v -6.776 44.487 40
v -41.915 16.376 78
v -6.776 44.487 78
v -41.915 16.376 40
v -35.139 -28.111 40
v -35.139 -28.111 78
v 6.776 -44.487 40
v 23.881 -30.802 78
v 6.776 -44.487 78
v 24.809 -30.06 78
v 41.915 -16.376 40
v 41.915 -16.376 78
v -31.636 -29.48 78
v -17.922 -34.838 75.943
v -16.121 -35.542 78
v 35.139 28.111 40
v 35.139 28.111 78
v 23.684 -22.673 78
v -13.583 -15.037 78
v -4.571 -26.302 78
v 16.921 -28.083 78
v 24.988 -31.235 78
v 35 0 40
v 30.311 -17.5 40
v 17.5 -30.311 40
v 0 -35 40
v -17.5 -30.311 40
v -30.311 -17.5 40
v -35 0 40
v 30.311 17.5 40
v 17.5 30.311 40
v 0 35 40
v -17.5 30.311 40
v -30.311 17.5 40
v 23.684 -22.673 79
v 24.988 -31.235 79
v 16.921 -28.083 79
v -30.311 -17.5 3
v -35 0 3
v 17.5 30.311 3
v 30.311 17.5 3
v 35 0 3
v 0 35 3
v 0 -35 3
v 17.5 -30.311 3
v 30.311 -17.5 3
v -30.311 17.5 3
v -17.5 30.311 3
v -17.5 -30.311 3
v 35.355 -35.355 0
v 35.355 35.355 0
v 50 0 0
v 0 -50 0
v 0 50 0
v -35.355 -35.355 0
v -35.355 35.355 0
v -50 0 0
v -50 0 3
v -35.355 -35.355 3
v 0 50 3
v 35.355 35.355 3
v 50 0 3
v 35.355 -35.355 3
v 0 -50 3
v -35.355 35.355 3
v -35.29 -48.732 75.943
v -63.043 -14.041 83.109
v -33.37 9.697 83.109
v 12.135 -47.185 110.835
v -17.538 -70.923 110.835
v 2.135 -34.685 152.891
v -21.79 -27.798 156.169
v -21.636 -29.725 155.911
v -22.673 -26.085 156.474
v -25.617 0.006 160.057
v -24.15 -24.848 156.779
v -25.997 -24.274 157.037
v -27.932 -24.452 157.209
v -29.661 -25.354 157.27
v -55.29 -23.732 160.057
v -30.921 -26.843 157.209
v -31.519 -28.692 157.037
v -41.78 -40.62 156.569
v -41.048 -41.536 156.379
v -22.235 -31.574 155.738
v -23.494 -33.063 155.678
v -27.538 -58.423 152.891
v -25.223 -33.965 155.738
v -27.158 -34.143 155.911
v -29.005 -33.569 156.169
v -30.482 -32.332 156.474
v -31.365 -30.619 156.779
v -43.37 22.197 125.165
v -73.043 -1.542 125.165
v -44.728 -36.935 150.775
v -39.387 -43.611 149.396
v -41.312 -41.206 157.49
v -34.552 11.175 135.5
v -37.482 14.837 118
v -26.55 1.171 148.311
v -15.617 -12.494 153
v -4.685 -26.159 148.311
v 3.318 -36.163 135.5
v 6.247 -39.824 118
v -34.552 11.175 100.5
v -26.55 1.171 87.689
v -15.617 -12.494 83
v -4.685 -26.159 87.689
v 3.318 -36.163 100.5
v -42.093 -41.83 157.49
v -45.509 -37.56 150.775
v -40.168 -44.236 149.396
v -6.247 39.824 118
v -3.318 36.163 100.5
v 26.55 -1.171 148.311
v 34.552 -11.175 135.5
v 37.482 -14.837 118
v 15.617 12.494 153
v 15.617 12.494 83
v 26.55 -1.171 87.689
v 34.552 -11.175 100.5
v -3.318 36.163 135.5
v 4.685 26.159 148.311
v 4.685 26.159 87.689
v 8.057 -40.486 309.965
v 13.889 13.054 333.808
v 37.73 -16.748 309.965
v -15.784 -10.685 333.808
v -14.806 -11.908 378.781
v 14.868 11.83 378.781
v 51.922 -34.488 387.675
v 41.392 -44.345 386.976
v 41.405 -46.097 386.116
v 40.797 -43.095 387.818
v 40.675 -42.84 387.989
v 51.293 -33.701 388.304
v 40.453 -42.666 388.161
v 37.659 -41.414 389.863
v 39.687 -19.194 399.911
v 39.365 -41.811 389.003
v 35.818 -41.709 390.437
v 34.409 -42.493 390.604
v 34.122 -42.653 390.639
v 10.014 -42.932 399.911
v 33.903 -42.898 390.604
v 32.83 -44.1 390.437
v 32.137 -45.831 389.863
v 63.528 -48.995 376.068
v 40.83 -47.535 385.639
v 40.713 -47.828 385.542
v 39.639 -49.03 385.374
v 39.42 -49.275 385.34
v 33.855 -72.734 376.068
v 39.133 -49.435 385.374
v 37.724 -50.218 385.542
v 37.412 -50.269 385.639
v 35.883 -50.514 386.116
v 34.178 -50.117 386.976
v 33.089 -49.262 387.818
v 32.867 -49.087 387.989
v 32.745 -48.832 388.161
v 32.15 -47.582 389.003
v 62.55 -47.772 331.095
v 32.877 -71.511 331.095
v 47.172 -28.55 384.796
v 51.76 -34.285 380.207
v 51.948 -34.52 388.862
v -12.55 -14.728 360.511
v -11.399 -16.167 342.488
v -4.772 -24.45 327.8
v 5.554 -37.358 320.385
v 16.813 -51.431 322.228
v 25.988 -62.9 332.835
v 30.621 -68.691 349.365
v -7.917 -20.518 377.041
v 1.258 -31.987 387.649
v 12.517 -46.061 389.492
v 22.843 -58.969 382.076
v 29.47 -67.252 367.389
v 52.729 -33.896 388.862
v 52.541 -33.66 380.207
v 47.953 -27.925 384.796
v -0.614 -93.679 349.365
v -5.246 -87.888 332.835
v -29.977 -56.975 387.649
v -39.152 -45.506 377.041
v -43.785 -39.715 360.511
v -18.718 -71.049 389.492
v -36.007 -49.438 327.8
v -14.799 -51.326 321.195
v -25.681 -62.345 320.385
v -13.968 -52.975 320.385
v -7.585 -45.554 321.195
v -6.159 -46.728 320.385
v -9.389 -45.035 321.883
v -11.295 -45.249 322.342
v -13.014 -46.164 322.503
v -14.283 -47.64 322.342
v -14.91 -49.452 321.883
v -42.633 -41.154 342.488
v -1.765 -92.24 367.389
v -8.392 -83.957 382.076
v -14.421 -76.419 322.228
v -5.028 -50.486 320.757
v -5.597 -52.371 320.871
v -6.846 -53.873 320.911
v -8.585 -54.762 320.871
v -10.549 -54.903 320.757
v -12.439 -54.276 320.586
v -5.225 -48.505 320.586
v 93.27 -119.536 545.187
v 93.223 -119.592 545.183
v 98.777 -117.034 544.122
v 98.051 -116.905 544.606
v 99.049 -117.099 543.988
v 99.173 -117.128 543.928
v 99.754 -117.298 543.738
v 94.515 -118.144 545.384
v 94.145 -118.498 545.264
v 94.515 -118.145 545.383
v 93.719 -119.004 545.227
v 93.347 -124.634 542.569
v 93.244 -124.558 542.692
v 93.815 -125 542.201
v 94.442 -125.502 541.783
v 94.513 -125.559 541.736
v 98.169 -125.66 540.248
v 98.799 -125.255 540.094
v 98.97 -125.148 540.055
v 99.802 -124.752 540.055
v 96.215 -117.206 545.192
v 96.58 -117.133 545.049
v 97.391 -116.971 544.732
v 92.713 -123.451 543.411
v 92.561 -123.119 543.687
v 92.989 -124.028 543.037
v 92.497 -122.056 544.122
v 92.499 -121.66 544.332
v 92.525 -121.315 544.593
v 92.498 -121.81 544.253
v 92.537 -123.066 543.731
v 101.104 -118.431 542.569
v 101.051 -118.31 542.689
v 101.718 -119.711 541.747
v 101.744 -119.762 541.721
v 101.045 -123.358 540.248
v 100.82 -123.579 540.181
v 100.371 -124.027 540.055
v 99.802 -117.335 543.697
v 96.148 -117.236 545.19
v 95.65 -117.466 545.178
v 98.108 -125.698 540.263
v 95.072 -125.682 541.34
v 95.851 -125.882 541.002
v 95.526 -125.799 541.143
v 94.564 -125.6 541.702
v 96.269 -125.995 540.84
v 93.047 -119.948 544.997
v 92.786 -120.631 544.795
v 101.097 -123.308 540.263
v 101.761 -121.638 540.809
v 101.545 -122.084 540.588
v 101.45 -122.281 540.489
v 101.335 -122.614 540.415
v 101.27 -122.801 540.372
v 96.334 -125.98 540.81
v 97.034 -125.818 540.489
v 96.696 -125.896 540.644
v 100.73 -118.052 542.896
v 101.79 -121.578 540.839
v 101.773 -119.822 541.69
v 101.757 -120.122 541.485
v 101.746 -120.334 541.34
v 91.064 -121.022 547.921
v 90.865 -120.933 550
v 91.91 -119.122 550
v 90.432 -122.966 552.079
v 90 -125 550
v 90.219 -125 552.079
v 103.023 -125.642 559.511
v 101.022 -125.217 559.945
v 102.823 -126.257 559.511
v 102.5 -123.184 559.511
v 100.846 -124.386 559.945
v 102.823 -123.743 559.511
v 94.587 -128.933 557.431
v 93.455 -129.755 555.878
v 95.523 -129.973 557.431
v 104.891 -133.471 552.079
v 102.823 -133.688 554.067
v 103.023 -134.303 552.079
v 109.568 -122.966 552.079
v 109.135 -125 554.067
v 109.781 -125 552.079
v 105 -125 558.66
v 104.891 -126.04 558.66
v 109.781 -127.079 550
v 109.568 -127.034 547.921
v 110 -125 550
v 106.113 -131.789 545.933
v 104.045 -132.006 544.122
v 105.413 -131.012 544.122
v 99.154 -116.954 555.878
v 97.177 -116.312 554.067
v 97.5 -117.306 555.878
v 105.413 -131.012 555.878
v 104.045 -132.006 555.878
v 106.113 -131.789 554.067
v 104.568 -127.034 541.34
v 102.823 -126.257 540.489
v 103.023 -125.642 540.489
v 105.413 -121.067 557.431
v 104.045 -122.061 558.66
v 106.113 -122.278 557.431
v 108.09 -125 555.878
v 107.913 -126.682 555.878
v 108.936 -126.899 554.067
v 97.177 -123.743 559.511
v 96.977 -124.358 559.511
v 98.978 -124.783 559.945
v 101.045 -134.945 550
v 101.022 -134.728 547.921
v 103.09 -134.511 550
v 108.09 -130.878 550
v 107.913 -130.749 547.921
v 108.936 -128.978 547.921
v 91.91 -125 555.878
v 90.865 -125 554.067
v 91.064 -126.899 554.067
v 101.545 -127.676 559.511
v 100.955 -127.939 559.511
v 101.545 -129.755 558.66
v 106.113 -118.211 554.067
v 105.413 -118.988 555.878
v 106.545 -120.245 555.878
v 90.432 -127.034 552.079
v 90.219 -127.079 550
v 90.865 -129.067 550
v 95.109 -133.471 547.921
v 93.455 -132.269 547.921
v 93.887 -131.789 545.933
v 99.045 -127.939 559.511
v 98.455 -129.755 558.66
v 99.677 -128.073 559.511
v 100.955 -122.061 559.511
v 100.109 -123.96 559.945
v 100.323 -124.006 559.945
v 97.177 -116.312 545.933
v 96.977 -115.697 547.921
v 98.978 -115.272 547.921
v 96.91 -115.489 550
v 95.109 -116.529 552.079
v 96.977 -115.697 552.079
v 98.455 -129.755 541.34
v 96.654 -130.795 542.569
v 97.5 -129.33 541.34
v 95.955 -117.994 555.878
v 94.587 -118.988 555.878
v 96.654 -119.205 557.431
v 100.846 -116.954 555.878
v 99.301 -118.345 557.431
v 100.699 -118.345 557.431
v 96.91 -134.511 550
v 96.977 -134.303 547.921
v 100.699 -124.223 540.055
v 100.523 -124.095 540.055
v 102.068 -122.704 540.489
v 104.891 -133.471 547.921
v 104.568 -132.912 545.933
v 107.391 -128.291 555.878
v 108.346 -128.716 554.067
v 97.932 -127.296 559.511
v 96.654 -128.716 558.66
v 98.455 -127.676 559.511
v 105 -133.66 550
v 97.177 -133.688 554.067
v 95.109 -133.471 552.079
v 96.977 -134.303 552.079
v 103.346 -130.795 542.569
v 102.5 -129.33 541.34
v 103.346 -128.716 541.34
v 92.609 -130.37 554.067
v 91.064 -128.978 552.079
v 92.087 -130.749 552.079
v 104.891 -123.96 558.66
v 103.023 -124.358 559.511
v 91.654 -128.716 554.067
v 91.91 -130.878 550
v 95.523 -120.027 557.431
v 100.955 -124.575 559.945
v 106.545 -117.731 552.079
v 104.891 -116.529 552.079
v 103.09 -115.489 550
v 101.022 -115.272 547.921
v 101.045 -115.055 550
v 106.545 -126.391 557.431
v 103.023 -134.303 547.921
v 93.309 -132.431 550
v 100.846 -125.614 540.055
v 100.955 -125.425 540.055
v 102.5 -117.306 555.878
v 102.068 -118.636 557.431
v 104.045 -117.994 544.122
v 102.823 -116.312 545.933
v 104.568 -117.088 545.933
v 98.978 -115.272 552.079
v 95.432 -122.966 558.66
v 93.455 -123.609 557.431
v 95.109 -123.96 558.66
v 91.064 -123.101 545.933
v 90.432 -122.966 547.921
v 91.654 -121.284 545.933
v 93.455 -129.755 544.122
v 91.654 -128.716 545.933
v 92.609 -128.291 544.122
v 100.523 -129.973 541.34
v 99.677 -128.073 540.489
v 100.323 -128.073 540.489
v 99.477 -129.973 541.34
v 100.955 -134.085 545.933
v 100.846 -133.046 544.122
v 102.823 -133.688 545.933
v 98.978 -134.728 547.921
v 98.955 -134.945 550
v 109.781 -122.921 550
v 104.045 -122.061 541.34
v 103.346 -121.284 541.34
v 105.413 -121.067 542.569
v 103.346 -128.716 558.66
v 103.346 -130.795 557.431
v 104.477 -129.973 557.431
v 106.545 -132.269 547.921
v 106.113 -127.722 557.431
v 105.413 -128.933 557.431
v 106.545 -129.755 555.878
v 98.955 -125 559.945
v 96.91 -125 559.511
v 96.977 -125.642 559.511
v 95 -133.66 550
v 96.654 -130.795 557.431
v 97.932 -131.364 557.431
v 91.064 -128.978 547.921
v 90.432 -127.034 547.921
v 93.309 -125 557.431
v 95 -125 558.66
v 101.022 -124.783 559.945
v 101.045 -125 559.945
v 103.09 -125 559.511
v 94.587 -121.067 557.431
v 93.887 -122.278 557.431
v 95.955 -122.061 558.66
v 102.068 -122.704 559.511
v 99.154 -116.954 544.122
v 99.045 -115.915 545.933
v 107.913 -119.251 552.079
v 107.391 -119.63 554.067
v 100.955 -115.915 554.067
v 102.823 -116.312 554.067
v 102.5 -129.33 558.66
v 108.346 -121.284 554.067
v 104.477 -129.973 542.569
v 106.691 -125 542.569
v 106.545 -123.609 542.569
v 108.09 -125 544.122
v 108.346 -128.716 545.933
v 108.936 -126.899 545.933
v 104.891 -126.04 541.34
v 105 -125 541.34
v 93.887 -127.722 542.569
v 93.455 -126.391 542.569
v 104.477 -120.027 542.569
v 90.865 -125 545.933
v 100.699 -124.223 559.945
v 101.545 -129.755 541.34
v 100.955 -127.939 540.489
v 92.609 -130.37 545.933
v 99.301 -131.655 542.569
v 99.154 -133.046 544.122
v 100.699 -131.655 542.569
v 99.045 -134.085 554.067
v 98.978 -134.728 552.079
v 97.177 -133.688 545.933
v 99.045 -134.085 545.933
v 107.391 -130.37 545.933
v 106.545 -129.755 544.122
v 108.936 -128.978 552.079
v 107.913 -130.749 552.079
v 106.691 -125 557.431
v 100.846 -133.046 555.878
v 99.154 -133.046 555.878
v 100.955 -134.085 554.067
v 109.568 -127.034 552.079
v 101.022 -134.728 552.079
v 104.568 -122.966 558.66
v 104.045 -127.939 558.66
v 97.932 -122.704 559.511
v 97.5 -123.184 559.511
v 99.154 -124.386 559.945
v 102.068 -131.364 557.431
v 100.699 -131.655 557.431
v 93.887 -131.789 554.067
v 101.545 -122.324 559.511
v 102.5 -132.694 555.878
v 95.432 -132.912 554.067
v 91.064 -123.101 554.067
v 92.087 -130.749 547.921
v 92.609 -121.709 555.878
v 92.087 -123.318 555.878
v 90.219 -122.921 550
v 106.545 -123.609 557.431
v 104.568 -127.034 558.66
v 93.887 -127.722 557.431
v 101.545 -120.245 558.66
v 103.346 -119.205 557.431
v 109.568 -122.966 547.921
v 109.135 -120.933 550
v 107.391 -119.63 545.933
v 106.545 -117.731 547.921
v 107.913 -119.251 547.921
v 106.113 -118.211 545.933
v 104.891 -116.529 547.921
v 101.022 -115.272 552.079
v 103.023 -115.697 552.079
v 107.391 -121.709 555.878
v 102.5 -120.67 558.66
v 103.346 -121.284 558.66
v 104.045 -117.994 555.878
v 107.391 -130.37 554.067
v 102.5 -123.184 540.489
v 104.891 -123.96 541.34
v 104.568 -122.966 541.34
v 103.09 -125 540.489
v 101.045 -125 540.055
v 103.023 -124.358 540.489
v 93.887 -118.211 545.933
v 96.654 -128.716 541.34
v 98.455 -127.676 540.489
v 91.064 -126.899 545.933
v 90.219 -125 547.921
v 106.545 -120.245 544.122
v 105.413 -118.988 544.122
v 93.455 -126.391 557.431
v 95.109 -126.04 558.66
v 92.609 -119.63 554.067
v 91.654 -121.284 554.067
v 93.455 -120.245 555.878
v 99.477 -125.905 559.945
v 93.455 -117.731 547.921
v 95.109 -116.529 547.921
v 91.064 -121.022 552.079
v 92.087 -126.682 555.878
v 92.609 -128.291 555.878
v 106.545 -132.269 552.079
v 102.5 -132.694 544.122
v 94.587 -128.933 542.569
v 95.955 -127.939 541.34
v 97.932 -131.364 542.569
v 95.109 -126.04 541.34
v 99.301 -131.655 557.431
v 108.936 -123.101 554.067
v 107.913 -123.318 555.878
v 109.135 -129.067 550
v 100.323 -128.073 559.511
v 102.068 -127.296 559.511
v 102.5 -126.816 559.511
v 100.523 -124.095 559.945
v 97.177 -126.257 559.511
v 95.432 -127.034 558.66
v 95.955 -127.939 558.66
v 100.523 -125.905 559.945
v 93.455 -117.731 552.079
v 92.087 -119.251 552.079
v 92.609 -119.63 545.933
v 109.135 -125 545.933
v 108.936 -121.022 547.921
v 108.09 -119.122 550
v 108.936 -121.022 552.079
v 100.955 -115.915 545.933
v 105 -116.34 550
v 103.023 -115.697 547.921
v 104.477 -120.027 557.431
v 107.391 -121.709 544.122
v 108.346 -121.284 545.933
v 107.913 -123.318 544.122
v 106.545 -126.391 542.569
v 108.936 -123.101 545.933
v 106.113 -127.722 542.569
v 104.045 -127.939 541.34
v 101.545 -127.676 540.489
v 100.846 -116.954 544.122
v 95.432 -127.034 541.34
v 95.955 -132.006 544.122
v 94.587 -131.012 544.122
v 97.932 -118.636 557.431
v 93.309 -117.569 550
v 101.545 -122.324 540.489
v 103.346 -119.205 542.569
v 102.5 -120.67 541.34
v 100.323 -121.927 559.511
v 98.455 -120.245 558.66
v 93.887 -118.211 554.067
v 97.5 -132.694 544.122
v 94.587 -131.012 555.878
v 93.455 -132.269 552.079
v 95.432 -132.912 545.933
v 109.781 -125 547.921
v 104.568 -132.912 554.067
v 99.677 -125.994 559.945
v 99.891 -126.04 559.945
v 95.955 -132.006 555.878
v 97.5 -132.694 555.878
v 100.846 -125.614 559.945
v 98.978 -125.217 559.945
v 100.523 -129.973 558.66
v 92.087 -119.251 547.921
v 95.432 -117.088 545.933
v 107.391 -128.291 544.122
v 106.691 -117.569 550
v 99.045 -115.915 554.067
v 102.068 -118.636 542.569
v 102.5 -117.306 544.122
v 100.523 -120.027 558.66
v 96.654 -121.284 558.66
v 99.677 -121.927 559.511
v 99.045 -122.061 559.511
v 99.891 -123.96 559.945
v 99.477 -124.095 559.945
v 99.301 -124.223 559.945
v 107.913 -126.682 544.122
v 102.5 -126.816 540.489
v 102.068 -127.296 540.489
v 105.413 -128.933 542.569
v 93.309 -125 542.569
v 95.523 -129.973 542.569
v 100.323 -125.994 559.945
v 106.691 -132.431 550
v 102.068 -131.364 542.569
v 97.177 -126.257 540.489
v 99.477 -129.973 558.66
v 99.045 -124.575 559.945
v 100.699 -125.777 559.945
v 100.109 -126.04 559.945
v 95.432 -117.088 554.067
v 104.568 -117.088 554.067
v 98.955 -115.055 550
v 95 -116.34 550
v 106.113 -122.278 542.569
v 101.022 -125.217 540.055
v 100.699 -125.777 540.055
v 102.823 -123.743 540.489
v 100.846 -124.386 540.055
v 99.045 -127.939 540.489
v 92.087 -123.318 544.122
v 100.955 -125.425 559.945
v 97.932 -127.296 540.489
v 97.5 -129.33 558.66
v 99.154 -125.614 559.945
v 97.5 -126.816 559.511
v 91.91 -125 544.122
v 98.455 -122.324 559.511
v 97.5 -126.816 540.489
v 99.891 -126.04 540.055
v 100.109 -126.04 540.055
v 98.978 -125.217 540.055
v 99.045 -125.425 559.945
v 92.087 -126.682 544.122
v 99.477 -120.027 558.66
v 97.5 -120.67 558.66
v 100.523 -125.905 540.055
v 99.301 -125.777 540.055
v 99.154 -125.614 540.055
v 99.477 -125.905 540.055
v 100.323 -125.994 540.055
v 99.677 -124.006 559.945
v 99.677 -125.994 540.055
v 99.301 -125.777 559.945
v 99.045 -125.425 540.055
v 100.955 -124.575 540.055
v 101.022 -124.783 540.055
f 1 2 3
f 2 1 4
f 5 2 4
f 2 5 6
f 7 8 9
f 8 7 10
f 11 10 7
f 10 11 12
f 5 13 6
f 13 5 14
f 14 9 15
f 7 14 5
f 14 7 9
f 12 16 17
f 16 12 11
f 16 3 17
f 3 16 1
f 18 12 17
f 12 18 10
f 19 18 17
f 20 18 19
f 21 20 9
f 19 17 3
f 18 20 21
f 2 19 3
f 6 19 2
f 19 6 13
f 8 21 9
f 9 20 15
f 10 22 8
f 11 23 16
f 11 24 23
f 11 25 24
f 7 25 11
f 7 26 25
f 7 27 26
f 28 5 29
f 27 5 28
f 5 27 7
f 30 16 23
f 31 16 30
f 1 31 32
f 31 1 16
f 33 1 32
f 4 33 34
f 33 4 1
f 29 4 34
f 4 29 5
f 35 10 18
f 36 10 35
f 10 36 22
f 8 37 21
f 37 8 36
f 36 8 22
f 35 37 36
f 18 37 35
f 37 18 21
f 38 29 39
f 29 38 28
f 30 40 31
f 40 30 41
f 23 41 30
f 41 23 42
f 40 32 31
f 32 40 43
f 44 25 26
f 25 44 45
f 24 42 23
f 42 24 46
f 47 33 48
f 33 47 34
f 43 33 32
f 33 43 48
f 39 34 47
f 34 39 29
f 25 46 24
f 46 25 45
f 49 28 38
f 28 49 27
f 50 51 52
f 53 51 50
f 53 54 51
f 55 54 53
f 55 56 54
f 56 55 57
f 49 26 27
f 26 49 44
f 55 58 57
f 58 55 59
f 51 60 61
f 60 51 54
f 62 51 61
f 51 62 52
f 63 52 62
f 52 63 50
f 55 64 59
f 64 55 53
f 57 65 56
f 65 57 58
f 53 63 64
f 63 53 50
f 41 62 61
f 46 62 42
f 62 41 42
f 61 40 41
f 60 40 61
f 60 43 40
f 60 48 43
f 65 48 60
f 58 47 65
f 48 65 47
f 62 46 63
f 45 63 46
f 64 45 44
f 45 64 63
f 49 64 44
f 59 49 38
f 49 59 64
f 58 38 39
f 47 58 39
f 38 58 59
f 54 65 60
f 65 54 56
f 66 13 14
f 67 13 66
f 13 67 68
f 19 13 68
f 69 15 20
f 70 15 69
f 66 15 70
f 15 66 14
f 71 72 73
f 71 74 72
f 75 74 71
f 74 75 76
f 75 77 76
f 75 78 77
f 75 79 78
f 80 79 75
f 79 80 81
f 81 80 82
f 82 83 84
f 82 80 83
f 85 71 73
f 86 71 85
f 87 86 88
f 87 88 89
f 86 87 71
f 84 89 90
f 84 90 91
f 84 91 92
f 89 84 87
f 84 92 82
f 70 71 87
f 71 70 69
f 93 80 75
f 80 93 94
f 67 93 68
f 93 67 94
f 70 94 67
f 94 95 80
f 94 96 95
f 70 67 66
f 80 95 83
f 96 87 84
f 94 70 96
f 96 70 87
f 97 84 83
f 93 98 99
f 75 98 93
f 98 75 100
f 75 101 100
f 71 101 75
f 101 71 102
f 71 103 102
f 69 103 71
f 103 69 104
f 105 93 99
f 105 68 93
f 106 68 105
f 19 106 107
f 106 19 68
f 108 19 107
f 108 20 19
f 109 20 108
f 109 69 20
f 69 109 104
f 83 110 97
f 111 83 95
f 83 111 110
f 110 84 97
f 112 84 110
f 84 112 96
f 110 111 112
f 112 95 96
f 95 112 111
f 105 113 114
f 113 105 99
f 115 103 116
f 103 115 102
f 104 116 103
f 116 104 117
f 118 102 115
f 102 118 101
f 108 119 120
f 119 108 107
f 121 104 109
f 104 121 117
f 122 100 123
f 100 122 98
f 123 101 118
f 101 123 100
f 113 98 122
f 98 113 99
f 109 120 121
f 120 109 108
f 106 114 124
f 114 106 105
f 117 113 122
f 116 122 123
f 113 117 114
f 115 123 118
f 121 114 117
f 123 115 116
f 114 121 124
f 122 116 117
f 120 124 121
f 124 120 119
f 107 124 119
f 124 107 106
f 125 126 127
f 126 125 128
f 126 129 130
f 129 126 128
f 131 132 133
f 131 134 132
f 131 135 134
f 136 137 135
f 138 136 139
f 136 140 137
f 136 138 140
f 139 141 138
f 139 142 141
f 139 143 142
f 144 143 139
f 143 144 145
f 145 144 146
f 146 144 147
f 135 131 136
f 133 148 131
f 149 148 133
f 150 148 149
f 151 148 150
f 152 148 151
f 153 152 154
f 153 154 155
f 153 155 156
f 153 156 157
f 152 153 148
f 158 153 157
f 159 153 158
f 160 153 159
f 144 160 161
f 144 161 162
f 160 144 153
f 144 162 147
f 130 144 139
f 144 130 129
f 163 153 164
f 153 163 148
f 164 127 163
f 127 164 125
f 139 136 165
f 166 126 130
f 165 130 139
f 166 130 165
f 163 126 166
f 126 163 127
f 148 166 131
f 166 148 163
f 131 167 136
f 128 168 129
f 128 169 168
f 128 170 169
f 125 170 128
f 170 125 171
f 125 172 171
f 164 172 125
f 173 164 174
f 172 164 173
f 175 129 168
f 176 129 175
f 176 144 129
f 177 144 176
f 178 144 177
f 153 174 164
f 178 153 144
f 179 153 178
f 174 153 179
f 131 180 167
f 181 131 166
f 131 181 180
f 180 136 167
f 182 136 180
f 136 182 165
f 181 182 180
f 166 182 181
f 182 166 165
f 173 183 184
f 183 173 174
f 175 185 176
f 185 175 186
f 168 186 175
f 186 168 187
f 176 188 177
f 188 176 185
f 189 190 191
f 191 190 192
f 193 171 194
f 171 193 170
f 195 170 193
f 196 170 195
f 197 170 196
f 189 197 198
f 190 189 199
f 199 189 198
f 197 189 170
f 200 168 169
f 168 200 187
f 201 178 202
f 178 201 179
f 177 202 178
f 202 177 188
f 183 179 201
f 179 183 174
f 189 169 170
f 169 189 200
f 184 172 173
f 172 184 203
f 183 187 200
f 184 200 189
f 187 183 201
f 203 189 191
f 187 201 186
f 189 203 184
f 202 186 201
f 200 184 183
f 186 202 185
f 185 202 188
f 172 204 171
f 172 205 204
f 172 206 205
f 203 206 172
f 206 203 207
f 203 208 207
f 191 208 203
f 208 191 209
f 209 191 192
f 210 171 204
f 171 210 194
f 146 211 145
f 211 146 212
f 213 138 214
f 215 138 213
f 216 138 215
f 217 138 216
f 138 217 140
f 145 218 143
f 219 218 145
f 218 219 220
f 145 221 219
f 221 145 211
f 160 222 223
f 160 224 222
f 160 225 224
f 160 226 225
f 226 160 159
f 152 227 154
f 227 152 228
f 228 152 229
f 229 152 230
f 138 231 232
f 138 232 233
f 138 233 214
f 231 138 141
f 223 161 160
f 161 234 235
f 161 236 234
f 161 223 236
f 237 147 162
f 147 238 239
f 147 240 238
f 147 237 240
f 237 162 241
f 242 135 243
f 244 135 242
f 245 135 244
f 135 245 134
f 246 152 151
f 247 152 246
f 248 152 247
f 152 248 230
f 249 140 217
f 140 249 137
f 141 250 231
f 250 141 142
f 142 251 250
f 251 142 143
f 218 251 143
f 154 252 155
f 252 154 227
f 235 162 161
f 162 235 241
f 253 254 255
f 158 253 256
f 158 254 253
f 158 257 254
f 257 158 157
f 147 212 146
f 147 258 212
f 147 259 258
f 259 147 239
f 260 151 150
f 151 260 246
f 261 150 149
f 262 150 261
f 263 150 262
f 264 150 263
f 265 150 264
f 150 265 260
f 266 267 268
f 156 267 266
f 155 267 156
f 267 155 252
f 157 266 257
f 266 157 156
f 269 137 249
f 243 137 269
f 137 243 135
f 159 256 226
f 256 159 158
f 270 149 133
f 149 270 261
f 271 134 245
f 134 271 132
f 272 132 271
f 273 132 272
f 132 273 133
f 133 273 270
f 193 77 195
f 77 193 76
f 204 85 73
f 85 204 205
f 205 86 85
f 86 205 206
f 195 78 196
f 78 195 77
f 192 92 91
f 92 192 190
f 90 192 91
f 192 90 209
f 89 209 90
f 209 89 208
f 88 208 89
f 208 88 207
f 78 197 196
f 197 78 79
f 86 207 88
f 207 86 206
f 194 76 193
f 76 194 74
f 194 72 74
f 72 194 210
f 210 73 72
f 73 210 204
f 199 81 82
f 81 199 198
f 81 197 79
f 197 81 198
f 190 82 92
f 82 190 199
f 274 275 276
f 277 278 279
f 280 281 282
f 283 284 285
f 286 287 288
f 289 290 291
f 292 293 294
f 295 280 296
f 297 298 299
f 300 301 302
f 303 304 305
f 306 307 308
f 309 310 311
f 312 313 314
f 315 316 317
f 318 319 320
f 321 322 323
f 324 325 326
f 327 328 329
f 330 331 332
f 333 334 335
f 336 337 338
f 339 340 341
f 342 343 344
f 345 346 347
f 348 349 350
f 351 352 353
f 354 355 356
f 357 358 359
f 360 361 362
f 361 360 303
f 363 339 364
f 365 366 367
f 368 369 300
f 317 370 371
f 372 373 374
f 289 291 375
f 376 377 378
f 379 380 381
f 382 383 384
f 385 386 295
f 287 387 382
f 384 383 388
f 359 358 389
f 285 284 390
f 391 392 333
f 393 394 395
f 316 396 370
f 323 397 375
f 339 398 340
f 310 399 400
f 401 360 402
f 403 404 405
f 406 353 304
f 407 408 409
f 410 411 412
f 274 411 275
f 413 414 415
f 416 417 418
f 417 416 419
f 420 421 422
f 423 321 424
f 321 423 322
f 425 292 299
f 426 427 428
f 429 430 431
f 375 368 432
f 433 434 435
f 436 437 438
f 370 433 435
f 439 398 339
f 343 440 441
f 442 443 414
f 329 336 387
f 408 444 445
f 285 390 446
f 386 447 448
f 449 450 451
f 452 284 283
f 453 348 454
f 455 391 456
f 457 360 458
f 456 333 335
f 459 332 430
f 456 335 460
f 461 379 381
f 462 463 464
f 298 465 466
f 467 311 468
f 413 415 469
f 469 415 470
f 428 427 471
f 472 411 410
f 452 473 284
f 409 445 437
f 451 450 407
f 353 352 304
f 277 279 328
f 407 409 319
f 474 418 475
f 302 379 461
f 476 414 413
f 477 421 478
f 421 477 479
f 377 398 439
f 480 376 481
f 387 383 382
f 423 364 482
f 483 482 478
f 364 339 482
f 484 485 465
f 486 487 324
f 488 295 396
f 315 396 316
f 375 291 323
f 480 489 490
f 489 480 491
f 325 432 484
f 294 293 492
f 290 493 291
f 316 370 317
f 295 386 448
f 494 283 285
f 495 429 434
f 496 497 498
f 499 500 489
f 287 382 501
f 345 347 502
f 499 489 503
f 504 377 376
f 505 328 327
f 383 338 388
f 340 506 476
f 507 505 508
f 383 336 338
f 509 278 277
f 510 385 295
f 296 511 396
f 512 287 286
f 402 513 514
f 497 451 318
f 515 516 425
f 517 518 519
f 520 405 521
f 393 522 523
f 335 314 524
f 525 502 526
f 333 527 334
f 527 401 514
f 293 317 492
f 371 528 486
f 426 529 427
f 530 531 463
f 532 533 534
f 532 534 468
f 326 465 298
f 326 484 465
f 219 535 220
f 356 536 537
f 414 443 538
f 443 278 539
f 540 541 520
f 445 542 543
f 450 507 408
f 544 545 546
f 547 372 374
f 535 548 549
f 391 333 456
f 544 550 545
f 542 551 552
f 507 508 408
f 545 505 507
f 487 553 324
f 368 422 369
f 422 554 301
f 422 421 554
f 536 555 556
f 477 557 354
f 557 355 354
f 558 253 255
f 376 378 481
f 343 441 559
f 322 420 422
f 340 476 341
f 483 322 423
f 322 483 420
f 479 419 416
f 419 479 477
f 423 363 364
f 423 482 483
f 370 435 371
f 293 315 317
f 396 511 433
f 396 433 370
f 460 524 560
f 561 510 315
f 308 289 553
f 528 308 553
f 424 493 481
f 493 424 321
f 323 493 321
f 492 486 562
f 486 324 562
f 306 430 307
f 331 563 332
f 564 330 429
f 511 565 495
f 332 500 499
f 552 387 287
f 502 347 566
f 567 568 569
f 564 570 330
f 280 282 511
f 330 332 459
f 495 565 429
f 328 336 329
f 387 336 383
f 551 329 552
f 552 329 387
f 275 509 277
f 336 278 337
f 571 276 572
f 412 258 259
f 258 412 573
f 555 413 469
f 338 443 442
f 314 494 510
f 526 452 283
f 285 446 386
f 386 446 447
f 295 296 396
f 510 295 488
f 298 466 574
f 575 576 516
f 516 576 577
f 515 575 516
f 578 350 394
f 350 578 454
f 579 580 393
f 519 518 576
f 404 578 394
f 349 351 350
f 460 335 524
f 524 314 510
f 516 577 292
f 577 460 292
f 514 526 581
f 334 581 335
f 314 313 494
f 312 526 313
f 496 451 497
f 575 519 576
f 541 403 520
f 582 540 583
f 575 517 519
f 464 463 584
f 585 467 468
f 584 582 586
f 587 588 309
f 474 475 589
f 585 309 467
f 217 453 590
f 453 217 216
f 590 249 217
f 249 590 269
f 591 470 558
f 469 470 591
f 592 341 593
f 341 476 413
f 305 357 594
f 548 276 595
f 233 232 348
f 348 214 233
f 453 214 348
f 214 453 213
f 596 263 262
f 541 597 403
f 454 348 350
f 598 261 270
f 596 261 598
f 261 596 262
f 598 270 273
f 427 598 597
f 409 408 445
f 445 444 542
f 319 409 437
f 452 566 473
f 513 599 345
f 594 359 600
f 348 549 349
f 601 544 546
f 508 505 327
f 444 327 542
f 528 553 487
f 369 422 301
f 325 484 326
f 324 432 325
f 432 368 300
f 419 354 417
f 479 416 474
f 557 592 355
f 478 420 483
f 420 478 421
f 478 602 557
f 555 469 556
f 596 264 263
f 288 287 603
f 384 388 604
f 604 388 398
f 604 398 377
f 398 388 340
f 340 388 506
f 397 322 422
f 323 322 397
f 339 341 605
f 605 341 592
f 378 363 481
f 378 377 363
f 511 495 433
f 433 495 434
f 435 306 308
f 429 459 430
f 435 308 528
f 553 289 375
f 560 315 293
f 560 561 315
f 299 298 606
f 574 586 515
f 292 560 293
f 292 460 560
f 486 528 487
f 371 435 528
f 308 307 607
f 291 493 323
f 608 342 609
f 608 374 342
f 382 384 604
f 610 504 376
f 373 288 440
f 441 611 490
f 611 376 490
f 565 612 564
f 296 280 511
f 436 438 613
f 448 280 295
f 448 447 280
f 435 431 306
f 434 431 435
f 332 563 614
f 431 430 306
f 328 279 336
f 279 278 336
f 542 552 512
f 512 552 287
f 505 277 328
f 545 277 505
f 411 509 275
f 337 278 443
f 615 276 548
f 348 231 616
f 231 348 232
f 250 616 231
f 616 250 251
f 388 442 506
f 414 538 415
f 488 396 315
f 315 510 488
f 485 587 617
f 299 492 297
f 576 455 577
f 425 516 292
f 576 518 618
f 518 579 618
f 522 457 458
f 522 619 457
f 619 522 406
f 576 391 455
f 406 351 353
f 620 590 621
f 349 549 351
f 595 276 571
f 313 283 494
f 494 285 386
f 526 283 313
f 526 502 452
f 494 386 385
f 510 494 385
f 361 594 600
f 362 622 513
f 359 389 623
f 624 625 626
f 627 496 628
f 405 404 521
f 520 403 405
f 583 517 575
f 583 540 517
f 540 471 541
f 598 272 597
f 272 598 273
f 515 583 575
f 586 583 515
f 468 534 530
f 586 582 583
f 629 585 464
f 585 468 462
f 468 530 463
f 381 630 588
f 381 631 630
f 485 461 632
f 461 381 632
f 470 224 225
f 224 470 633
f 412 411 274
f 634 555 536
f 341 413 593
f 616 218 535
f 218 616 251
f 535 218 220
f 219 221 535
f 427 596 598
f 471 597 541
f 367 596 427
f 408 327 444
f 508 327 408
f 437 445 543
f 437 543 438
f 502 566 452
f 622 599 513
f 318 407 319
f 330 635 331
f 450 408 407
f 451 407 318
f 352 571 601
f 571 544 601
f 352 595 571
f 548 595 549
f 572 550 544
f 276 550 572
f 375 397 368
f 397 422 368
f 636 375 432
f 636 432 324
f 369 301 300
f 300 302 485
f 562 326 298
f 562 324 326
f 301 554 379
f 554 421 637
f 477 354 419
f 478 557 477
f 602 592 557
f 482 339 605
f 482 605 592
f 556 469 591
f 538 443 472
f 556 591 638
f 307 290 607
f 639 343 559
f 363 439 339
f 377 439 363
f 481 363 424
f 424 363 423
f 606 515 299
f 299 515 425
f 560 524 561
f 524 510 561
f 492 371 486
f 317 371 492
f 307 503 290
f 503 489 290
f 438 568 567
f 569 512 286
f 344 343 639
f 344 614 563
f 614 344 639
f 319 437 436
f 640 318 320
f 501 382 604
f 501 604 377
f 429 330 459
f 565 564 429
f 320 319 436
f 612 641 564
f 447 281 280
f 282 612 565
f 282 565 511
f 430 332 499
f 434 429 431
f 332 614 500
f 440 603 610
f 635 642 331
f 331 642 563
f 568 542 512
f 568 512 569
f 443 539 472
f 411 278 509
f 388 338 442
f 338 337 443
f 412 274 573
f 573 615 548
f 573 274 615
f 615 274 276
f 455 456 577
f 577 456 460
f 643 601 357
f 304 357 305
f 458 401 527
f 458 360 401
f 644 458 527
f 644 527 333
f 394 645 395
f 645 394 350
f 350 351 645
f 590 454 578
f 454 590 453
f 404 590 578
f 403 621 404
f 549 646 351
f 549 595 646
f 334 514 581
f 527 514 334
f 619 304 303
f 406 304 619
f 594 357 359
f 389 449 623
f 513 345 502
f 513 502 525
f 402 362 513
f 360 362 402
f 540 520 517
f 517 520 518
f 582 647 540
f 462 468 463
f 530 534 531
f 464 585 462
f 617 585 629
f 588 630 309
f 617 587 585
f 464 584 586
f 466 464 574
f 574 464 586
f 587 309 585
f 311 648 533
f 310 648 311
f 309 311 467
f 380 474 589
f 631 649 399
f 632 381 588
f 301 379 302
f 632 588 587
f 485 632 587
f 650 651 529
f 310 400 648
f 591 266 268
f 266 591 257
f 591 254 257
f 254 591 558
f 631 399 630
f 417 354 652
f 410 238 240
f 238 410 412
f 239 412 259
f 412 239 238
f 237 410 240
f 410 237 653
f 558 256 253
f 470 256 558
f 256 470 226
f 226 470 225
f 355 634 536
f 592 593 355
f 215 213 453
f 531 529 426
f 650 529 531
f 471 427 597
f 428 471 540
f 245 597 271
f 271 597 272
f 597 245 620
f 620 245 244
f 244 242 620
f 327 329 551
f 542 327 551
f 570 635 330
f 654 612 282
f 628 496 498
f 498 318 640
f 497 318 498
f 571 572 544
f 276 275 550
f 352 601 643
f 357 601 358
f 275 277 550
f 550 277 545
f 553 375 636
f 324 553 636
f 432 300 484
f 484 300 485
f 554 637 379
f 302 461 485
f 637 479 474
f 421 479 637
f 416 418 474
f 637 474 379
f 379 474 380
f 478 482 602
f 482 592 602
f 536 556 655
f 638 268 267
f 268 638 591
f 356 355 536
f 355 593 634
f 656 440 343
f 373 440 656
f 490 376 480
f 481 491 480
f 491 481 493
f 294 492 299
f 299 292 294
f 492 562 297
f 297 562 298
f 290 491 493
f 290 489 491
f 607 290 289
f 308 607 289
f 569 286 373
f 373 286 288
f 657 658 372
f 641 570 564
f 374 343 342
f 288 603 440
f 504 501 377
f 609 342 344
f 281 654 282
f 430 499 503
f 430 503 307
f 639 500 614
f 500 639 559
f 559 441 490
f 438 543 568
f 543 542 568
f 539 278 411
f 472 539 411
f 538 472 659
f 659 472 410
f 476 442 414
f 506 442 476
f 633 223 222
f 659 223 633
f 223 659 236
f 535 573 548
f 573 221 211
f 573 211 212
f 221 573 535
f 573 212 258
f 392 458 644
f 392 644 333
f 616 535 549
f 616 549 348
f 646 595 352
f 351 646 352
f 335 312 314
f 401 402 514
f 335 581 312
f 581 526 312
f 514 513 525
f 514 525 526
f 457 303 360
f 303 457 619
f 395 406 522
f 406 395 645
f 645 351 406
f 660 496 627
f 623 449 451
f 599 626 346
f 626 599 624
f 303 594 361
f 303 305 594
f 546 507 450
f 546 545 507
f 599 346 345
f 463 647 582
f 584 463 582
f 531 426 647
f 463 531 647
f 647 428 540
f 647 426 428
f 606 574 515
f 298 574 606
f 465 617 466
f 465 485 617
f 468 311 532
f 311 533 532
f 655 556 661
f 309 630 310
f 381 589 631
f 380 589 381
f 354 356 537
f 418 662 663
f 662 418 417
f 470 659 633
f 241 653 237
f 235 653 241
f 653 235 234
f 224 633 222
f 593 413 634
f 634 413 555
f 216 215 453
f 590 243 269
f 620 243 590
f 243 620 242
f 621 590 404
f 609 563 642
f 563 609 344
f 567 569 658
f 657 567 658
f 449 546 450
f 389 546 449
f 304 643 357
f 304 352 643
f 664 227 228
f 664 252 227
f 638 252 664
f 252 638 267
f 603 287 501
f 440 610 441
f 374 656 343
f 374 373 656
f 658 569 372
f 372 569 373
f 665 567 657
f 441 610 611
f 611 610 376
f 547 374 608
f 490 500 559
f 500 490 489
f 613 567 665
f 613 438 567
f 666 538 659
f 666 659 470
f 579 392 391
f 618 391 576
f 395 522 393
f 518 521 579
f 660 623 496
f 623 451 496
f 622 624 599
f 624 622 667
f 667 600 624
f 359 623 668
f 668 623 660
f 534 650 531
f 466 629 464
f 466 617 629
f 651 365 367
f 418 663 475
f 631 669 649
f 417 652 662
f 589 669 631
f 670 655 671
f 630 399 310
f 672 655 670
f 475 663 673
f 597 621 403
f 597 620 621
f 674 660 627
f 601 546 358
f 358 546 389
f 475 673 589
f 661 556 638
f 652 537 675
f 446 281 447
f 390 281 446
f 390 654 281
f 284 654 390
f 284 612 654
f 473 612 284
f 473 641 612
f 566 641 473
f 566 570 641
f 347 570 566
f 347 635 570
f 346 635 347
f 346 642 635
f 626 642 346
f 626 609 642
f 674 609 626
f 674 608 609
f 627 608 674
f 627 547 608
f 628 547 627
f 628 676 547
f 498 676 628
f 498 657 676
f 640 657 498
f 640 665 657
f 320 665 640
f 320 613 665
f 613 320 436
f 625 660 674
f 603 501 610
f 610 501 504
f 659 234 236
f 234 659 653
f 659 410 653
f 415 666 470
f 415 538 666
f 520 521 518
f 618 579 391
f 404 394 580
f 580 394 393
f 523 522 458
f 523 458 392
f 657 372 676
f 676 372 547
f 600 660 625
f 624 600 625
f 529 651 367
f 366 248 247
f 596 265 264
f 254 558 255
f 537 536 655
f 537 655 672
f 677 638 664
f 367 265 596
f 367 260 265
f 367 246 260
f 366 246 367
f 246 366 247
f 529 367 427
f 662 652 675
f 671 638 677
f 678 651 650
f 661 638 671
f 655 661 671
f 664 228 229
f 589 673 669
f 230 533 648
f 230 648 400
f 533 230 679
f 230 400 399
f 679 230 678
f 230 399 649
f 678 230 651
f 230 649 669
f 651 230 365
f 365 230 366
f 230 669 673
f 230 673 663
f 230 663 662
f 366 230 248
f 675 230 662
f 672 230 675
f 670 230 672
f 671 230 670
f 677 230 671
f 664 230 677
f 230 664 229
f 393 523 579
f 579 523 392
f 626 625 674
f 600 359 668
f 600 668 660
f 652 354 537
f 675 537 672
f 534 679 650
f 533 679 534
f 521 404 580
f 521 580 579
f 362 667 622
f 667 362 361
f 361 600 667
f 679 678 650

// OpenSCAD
// Robot Arm Model

Table_h=3;
Table_xy=100;

	JointA_d=70;
	JointA_h=40;
	JointB_d=90;
	JointB_h=38;

	RodAB_l=240;
	RodBC_l=230;
	
BaseToJ1_z=40;
BaseToJ1_x=-JointA_h/2;
J1_CL_z=JointA_h+JointB_h+BaseToJ1_z;

module DrawJoint(Rot_a=0){
	cylinder(d=JointA_d,h=JointA_h,$fn=12);
	translate([0,0,JointA_h]) rotate([0,0,Rot_a]){
		cylinder(d=JointB_d,h=JointB_h,$fn=6);
		translate([0,JointB_d/2-10,JointB_h]) rotate([0,0,-30]) color("Tan") cylinder(d=10,h=1,$fn=3);
	}
} // DrawJoint

module DrawBase(Rot_a=0){
	translate([0,0,Table_h/2]) cylinder(d=Table_xy,h=Table_h,$fn=8,center=true);
	
	DrawJoint(Rot_a=Rot_a);
} // DrawBase

$t=0.0;

function XY2Deg(X,Y) = -atan2(X,Y);
function Dist(X,Y) = sqrt(pow(X,2)+pow(Y,2));

//     C
//     /\
//   b/  \a
// A ----- B
//     c
function AngleA(a,b,c) = acos( (pow(b,2)+pow(c,2)-pow(a,2)) / (2 * b * c));
function AngleB(a,b,c) = acos( (pow(a,2)+pow(c,2)-pow(b,2)) / (2 * a * c));
function AngleC(a,b,c) = acos( (pow(a,2)+pow(b,2)-pow(c,2)) / (2 * a * b));

Obj_x=100;
Obj_y=-125;
Obj_z=550; // from base plate or table surface
Adj_z=Obj_z-J1_CL_z; // Z relitive to J1 rotation center

translate([Obj_x,Obj_y,Obj_z]) color("Blue") sphere(d=20);

BaseRot_a=XY2Deg(Obj_x,Obj_y);
d=Dist(Obj_x,Obj_y);  // distance in XY plane
hypJ2=Dist(d,Adj_z); // end to J1 distance
Targ_a=XY2Deg(d,Adj_z);
J2Rot_a=180-AngleC(RodAB_l,RodBC_l,hypJ2);
J1Ang_B=AngleB(RodAB_l,RodBC_l,hypJ2);

//echo(J1Ang_B=J1Ang_B);
J1Rot_a=Targ_a+J1Ang_B;
echo(BaseRot=BaseRot_a);
echo(J1Rot_a=J1Rot_a);
//echo(H_Dist=d);
echo(J2Rot_a=J2Rot_a);
//BaseRot_a=$t*360;




//J1Rot_a=abs($t*2-1)*90; // -170..170
//J1Rot_a=-56; // -120..120
//J2Rot_a=(1-abs($t*2-1))*90-45;
//J2Rot_a=90; // -160..160

DrawBase(Rot_a=BaseRot_a);

translate([0,0,JointA_h+JointB_h]) rotate([0,0,BaseRot_a]) translate([BaseToJ1_x,0,BaseToJ1_z]) rotate([0,90,0]) rotate([0,0,90]){

	DrawJoint(Rot_a=J1Rot_a);
	rotate([0,0,J1Rot_a]) translate([0,0,JointA_h+JointB_h/2]) {
		rotate([-90,0,0]) color("Silver") cylinder(d=10,h=RodAB_l);
		translate([0,RodAB_l,JointA_h/2])rotate([0,180,0])
		{
			DrawJoint(Rot_a=J2Rot_a);
			translate([0,0,JointA_h+JointB_h/2])rotate([0,0,J2Rot_a]){
				rotate([-90,0,0]) color("Silver") cylinder(d=10,h=RodBC_l);
			}
		}
		
	}
	
}
